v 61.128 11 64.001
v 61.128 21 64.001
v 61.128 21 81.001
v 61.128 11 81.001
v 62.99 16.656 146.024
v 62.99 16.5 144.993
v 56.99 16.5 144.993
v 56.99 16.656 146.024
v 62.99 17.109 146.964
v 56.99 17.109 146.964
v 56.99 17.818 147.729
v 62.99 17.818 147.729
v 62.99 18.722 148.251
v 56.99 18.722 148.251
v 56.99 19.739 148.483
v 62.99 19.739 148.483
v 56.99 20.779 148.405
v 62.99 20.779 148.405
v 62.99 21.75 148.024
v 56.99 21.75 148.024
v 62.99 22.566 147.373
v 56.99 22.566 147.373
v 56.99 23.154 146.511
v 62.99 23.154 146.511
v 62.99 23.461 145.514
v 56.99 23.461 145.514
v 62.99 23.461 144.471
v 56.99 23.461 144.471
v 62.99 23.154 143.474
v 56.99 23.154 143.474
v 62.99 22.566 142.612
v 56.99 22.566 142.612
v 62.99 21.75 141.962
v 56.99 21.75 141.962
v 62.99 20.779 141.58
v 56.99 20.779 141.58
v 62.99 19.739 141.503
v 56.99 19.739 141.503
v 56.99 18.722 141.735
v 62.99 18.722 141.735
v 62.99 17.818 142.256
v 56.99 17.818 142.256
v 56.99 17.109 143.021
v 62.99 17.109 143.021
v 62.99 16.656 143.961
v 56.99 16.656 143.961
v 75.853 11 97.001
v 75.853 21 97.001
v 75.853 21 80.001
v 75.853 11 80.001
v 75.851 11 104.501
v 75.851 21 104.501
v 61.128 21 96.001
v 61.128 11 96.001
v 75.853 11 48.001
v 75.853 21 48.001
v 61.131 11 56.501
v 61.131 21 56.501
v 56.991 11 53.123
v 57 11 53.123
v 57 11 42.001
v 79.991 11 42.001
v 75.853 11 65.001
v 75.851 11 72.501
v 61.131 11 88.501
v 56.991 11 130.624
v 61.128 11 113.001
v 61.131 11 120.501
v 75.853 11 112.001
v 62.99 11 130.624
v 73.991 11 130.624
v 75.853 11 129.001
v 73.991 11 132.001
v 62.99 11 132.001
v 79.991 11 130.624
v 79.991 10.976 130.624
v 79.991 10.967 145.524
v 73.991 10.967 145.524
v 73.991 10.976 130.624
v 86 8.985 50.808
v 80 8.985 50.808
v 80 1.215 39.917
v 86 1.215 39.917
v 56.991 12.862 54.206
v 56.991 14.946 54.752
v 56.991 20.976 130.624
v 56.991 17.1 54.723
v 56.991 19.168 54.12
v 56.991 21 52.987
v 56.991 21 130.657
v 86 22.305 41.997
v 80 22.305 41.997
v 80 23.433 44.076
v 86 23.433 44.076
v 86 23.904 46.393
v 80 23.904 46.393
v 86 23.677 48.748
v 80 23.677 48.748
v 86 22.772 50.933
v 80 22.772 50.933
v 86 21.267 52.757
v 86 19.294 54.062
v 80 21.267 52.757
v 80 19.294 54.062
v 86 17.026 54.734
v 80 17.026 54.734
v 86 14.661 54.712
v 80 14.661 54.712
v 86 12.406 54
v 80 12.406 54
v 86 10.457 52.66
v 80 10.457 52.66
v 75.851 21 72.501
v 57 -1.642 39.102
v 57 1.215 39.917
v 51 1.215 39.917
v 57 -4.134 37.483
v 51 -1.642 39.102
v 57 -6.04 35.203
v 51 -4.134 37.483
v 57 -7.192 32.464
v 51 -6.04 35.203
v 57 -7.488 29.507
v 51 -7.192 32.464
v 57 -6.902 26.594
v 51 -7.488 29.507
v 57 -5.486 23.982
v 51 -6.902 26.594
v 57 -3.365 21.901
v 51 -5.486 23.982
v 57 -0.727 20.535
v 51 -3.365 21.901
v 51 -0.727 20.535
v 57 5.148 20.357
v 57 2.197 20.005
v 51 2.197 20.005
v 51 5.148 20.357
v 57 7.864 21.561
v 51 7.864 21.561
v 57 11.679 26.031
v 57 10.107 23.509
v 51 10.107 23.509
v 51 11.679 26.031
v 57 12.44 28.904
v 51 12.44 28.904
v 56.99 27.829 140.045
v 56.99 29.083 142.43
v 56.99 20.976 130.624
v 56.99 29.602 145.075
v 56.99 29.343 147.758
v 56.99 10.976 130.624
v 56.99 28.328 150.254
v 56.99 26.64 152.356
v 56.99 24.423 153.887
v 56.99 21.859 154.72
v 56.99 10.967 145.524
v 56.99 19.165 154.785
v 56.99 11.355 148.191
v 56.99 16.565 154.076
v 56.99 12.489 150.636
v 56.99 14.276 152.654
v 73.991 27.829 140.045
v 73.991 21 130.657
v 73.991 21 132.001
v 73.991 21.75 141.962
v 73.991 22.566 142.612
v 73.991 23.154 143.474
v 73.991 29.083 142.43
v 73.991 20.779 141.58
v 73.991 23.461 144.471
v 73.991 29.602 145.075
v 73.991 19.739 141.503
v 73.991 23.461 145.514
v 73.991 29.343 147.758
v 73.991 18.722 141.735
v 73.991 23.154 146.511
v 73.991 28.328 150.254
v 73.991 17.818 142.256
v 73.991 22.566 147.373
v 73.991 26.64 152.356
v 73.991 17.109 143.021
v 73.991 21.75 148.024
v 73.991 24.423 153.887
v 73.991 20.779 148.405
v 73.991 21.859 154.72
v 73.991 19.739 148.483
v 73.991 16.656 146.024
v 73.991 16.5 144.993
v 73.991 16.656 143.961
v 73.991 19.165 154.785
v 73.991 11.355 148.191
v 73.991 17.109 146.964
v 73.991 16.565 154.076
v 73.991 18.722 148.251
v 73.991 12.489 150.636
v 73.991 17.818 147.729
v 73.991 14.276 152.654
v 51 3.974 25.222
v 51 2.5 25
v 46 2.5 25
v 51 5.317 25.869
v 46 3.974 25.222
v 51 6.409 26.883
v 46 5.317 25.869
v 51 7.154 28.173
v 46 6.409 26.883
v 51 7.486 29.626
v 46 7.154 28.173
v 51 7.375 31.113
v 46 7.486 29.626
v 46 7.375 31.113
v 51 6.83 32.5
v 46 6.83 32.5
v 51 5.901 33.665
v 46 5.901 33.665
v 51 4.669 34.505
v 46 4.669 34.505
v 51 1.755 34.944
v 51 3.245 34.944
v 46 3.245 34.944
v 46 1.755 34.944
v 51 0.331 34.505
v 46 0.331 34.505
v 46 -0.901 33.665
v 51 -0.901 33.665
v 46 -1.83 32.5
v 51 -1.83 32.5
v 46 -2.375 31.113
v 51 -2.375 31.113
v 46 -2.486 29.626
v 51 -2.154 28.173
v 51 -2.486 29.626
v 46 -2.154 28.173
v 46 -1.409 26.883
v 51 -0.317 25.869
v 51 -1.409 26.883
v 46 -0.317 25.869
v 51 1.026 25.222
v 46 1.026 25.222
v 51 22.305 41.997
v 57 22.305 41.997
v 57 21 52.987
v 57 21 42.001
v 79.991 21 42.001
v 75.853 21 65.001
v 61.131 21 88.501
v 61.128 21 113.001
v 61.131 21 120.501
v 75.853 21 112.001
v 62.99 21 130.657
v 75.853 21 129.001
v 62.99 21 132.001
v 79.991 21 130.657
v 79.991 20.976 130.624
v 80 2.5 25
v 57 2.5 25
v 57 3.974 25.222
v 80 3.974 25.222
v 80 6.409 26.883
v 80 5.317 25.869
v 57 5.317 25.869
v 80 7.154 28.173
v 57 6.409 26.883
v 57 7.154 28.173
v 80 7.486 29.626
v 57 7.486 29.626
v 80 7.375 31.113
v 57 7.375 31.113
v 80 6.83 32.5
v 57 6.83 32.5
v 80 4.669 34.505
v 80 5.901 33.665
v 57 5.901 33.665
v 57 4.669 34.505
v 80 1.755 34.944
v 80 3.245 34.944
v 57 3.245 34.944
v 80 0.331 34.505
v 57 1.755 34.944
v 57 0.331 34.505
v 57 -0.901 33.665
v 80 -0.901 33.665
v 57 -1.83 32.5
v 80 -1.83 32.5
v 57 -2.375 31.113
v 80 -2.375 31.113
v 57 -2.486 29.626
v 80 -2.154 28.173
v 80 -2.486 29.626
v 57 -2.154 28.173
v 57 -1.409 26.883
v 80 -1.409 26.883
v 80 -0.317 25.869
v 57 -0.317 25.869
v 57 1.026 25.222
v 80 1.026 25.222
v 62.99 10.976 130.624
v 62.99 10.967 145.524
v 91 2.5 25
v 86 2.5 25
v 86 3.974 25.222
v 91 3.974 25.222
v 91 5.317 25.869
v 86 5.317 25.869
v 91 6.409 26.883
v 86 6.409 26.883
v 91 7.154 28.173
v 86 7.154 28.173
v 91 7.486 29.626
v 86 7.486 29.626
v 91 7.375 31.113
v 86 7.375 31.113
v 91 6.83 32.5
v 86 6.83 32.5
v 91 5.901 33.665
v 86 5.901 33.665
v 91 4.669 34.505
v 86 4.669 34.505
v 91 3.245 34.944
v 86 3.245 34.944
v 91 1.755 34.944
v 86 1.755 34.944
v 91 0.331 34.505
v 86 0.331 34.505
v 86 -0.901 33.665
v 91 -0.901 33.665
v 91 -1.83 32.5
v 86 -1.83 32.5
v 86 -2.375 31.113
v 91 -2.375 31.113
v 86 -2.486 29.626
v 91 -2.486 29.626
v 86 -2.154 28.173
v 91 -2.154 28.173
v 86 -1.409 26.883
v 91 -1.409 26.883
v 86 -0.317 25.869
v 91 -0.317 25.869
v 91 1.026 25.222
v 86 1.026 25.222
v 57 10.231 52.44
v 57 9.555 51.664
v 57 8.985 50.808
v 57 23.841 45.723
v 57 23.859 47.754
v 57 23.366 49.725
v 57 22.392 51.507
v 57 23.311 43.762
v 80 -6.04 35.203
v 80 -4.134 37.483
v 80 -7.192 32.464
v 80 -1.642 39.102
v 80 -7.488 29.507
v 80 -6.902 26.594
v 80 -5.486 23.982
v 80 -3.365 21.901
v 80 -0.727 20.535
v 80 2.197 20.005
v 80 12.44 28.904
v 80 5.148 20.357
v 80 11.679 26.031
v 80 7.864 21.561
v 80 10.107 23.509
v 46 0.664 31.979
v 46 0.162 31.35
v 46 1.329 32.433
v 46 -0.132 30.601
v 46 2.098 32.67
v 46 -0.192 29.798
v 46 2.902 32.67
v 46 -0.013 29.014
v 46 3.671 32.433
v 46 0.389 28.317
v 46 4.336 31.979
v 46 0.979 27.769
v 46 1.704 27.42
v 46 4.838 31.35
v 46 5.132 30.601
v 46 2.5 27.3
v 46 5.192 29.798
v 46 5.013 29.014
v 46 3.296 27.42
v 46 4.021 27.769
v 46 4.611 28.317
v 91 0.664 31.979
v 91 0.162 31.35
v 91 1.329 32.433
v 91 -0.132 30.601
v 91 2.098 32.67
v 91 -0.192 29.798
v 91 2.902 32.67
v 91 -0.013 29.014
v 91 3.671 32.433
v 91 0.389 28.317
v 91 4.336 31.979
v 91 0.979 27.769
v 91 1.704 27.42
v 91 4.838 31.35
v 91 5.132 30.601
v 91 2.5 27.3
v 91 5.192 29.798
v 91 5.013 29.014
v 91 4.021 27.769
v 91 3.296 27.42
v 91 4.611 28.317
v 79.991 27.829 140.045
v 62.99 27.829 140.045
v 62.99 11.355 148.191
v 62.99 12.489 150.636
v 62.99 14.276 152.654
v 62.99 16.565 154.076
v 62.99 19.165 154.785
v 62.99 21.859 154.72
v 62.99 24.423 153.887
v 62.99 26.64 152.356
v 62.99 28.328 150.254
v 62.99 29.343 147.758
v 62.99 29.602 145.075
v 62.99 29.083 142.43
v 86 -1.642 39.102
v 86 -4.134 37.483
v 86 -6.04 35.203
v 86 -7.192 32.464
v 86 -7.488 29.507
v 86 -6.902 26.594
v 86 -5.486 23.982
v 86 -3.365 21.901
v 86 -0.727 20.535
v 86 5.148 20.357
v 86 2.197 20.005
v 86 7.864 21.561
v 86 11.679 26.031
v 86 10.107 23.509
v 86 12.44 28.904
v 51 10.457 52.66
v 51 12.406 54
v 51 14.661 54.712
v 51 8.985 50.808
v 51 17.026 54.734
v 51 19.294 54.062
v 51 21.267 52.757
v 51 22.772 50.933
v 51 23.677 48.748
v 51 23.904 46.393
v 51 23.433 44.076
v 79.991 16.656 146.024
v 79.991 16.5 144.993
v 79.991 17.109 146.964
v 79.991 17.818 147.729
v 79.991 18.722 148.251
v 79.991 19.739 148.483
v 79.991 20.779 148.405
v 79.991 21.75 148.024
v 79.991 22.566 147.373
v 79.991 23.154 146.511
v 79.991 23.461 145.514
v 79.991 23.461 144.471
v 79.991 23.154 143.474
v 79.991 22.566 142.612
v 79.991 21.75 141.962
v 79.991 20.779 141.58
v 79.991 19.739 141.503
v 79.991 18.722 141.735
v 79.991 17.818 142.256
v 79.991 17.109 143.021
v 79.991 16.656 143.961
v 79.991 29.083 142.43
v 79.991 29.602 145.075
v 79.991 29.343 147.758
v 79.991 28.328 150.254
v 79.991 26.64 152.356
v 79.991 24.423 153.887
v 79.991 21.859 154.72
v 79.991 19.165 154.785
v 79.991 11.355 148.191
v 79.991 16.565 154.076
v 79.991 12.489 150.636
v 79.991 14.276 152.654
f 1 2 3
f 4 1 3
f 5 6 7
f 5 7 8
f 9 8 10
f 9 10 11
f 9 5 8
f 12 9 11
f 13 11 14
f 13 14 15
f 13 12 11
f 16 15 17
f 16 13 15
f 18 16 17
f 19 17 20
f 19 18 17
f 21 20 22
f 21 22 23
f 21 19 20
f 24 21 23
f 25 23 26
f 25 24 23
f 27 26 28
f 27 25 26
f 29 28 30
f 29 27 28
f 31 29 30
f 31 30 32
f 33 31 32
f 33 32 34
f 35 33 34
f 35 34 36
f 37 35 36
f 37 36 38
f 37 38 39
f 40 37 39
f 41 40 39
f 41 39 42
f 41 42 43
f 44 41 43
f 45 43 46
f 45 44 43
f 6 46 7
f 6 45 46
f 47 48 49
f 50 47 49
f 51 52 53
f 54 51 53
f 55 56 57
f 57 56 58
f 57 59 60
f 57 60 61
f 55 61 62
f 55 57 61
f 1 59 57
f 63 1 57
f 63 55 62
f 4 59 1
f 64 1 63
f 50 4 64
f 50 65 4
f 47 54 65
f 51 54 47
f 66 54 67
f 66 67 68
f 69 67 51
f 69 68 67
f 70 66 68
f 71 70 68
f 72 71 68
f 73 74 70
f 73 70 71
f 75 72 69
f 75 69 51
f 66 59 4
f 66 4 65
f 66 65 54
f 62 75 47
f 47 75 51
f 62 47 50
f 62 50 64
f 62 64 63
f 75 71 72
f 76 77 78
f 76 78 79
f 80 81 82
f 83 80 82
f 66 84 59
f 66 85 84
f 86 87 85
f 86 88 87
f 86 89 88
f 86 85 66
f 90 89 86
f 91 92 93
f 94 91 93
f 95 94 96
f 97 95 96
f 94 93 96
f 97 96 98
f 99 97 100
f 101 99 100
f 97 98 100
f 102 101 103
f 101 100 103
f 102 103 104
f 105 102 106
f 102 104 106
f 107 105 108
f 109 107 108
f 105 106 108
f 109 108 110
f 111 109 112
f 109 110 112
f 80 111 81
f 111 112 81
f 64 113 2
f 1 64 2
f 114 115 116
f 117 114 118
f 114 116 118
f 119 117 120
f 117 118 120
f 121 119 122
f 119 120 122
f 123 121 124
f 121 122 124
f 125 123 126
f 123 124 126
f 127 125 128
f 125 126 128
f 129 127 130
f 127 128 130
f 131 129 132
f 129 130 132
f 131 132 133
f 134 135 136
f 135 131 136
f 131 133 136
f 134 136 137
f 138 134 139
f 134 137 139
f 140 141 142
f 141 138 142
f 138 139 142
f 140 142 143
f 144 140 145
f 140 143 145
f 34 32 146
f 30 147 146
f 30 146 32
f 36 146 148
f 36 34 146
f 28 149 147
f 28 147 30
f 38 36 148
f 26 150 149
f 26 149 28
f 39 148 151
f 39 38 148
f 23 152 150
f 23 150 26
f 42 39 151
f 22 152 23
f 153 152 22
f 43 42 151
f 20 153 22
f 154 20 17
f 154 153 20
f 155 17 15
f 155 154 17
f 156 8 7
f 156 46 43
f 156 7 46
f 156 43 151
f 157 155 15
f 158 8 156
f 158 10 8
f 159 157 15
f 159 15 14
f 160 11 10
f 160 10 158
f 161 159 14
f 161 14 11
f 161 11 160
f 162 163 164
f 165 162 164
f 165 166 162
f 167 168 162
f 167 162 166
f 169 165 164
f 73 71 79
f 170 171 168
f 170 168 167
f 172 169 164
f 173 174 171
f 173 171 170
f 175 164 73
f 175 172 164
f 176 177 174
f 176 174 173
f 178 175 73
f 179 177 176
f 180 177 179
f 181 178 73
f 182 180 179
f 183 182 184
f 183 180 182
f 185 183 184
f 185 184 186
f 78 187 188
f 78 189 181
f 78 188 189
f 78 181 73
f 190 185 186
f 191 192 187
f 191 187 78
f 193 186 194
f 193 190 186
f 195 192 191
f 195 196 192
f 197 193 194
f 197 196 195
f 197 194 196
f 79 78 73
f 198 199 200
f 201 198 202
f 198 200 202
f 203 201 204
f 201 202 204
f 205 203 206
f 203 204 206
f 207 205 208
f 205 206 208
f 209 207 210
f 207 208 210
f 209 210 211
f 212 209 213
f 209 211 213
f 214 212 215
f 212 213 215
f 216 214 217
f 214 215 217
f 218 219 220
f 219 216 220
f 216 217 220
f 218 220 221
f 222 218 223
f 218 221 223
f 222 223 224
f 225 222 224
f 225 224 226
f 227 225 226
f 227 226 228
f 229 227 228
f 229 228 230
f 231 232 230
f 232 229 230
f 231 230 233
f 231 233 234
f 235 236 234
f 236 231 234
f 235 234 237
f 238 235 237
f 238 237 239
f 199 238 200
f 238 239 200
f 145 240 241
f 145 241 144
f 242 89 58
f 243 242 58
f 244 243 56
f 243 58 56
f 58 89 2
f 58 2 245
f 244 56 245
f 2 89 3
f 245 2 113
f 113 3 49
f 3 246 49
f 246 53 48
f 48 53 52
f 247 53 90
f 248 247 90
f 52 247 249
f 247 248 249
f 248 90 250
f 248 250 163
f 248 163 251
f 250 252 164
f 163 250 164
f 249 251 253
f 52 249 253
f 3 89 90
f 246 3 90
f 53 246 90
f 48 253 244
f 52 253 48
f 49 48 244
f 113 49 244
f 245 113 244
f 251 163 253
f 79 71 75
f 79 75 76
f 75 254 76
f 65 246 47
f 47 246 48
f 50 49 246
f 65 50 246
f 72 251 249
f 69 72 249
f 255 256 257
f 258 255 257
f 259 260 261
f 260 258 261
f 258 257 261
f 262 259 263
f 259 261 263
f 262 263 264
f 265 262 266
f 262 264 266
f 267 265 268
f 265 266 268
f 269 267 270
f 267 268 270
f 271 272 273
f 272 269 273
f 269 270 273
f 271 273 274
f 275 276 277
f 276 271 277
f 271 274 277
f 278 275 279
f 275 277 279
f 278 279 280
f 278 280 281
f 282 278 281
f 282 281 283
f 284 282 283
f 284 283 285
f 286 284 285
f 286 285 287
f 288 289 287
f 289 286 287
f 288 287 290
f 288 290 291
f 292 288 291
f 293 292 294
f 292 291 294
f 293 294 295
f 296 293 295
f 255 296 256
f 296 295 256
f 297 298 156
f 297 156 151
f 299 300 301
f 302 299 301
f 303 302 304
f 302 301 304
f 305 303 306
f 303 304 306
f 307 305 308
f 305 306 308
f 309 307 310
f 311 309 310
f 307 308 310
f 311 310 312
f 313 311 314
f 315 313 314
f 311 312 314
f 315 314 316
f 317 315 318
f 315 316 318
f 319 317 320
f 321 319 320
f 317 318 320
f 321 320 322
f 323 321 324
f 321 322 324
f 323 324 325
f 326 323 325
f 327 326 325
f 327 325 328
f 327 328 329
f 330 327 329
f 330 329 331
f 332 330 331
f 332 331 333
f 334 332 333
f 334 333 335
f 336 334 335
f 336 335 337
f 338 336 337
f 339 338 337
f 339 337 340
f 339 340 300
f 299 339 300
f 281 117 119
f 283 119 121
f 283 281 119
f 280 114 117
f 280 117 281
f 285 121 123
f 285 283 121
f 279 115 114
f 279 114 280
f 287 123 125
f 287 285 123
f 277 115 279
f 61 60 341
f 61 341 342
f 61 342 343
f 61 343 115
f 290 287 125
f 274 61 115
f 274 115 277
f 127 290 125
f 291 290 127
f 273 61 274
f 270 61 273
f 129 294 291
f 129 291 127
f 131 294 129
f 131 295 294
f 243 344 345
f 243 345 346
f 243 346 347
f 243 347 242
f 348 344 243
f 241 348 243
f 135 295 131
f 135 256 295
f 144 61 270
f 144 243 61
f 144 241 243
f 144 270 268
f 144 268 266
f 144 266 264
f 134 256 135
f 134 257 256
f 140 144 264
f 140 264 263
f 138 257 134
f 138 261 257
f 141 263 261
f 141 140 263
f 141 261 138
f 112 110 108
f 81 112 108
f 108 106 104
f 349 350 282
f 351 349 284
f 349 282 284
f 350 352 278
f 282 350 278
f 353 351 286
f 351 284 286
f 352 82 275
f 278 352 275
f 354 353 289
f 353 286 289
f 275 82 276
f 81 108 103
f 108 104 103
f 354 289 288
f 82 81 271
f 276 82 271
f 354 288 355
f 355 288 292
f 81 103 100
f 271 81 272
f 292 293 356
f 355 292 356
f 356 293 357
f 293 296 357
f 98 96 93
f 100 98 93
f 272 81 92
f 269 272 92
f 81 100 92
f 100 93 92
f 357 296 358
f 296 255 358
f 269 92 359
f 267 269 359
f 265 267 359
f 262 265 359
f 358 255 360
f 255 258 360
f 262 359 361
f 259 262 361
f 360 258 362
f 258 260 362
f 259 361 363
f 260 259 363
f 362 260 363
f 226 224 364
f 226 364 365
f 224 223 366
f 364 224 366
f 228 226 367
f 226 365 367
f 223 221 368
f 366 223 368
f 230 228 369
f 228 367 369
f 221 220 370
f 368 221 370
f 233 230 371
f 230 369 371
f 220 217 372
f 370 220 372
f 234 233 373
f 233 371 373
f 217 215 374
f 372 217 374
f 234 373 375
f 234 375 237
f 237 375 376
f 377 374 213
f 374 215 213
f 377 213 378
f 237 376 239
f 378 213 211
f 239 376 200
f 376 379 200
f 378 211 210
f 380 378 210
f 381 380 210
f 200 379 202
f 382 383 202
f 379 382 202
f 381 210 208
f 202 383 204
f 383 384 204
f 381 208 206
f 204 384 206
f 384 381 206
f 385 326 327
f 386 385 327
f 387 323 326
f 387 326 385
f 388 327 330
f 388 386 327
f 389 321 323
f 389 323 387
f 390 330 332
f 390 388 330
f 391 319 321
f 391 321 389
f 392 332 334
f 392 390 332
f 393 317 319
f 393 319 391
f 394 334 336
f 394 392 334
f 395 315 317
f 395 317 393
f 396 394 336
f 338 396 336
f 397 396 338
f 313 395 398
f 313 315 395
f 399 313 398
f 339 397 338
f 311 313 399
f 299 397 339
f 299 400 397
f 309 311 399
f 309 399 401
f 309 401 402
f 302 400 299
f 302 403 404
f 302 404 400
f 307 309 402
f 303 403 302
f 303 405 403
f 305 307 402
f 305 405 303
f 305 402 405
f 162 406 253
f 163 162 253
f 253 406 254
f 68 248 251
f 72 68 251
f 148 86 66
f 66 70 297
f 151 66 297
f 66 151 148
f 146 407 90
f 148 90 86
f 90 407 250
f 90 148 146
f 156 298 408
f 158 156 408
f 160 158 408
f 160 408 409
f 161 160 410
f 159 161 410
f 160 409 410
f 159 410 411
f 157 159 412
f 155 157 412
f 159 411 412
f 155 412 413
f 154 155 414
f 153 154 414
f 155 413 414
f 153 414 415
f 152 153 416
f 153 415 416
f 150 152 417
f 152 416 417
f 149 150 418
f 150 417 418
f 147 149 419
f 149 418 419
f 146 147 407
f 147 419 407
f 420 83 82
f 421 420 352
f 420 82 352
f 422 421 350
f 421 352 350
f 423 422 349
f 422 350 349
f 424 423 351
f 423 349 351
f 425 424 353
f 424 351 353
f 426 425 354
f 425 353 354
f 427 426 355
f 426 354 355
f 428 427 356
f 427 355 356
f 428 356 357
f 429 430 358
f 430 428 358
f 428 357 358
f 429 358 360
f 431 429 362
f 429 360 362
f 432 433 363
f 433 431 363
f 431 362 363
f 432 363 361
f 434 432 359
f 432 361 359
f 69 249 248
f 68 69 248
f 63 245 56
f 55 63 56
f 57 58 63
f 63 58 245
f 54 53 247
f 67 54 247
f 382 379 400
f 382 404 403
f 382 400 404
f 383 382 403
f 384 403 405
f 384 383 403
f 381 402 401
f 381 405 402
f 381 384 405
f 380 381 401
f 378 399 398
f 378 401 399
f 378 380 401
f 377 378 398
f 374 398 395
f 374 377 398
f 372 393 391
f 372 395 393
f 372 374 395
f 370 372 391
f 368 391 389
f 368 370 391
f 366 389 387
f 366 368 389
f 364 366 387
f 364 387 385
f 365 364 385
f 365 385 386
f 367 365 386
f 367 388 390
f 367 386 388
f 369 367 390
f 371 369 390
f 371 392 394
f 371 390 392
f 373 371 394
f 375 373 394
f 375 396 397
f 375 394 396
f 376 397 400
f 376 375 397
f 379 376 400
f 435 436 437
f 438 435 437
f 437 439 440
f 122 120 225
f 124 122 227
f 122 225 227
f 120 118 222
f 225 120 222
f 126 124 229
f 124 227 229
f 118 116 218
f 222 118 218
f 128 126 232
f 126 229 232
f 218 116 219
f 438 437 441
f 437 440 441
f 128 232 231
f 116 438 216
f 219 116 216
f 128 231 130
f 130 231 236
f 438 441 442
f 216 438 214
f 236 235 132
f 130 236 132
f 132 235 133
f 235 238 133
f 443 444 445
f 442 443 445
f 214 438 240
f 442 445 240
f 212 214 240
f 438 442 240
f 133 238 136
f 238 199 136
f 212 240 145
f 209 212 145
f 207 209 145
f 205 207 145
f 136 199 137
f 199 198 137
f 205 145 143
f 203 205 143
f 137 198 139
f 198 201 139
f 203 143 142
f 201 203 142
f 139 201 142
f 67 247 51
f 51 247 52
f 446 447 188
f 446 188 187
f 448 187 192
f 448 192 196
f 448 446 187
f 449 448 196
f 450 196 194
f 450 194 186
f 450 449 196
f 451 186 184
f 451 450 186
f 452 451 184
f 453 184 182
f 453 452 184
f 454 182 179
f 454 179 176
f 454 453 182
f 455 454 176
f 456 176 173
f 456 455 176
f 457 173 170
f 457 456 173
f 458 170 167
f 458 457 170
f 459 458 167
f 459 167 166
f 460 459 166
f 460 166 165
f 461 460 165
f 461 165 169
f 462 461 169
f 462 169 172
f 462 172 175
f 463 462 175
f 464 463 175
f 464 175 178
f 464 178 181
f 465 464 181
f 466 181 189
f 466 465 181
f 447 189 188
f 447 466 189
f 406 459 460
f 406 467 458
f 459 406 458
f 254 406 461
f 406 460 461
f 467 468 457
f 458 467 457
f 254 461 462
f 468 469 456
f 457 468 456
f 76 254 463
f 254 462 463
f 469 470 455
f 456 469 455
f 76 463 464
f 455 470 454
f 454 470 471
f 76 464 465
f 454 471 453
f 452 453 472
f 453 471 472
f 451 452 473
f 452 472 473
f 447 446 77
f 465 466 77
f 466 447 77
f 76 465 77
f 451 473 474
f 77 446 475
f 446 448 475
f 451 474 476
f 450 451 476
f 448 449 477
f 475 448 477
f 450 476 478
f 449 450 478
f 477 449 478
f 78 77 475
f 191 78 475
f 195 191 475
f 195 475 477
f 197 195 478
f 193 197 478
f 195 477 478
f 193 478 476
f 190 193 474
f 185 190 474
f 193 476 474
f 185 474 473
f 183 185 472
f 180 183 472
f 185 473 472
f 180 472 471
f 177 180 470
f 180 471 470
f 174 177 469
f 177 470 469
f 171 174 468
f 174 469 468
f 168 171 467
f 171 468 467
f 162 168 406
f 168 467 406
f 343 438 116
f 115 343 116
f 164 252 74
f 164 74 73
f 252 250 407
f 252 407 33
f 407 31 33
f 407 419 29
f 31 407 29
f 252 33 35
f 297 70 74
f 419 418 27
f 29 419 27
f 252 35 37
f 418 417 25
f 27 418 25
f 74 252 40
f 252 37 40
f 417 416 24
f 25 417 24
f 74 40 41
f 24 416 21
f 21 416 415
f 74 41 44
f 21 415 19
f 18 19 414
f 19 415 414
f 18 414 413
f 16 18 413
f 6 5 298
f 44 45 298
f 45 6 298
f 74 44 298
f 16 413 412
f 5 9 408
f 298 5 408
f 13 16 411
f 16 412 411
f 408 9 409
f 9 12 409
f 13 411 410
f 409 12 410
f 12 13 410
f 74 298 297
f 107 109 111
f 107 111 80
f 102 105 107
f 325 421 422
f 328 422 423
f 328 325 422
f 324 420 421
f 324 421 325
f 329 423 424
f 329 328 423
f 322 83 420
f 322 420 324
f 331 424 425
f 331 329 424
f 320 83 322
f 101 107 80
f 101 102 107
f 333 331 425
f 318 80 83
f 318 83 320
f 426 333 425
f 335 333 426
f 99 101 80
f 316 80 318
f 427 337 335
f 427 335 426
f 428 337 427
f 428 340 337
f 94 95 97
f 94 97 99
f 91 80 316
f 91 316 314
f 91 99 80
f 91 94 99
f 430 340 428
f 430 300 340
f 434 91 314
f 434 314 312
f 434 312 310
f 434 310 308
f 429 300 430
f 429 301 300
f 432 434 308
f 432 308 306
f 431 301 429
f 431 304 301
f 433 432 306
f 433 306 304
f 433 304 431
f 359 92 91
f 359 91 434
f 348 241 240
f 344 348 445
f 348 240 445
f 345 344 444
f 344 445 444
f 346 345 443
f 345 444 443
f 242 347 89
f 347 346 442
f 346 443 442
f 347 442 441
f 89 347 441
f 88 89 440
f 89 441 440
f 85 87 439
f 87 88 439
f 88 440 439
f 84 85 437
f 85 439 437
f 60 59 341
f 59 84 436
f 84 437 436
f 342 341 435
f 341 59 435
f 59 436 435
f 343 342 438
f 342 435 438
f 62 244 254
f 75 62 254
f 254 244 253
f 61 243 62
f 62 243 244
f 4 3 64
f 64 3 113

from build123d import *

# Parameters (mm, degrees)
SKETCH023_R       = 3.5
EXTRUDE022_DEPTH  = 6
SKETCH021_W       = 23
SKETCH021_H       = 90
EXTRUDE020_DEPTH  = 10
CYLINDER028_R     = 3
CYLINDER028_DEPTH = 25
CYLINDER027_R     = 7
CYLINDER027_DEPTH = 30
CYLINDER026_R     = 10
CYLINDER026_DEPTH = 6
EXTRUDE021_DEPTH  = 6
CYLINDER030_R     = 2.7
CYLINDER030_DEPTH = 50
CYLINDER029_R     = 5
CYLINDER029_DEPTH = 45


with BuildPart() as union_brazo_central004:
    # Sketch023 → Extrude022 (new body)
    with BuildSketch(Plane(origin=(0, 0, 0), x_dir=(0, -1, 0), z_dir=(-1, 0, 0))):
        with BuildLine():
            ThreePointArc((-10.966848, 145.524062), (-23.171274, 154.396494), (-27.829317, 140.044816))
            Line((-27.829317, 140.044816), (-20.975712, 130.624062))
            Line((-20.975712, 130.624062), (-10.975712, 130.624062))
            Line((-10.966848, 145.524062), (-10.975712, 130.624062))
        make_face()
        with Locations((-20.000471, 144.992747)):
            Circle(SKETCH023_R, mode=Mode.SUBTRACT)
    extrude(amount=EXTRUDE022_DEPTH)


with BuildPart() as union_brazo_central004_1:
    # Extrude022 placement: moved
    add(union_brazo_central004.part.moved(Location((62.99, 0, 0))))


with BuildPart() as union_brazo_central005:
    # Link021 base: copy of Union brazo central004
    add(union_brazo_central004_1.part)


with BuildPart() as union_brazo_central005_1:
    # Link021 placement: moved
    add(union_brazo_central005.part.moved(Location((17.001, 0, 0))))


with BuildPart() as brazo_central_triangulos:
    # Sketch021 → Extrude020 (new body)
    with BuildSketch(Plane.XZ):
        with Locations((68.040845, 88.110787)):
            Rectangle(SKETCH021_W, SKETCH021_H)
        Polygon((60.680845, 57.610787), (75.403277, 66.110787), (75.403277, 49.110787), align=None, mode=Mode.SUBTRACT)
        Polygon((60.678413, 65.110787), (60.678413, 82.110787), (75.400845, 73.610787), align=None, mode=Mode.SUBTRACT)
        Polygon((60.680845, 89.610787), (75.403277, 98.110787), (75.403277, 81.110787), align=None, mode=Mode.SUBTRACT)
        Polygon((60.678413, 97.110787), (60.678413, 114.110787), (75.400845, 105.610787), align=None, mode=Mode.SUBTRACT)
        Polygon((60.680845, 121.610787), (75.403277, 130.110787), (75.403277, 113.110787), align=None, mode=Mode.SUBTRACT)
    extrude(amount=EXTRUDE020_DEPTH)


with BuildPart() as brazo_central_triangulos_1:
    # Extrude020 placement: moved
    add(brazo_central_triangulos.part.moved(Location((0.45, 21, -1.11))))


with BuildPart() as rotor011:
    # Cylinder028 → Cylinder028 (new body)
    with BuildSketch(Plane(origin=(40, 2.5, 30), x_dir=(0, 0, -1), z_dir=(1, 0, 0))):
        Circle(CYLINDER028_R)
    extrude(amount=CYLINDER028_DEPTH)


with BuildPart() as rotor010:
    # Cylinder027 → Cylinder027 (new body)
    with BuildSketch(Plane(origin=(63, 2.5, 30), x_dir=(0, 0, -1), z_dir=(1, 0, 0))):
        Circle(CYLINDER027_R)
    extrude(amount=CYLINDER027_DEPTH)


with BuildPart() as union_motor_izq001:
    # Cylinder026 → Cylinder026 (new body)
    with BuildSketch(Plane(origin=(54, 2.5, 30), x_dir=(0, 0, -1), z_dir=(1, 0, 0))):
        Circle(CYLINDER026_R)
    extrude(amount=CYLINDER026_DEPTH)

    # Cut013: cut Rotor010
    add(rotor010.part, mode=Mode.SUBTRACT)

    # Cut014: cut Rotor011
    add(rotor011.part, mode=Mode.SUBTRACT)


with BuildPart() as union_motor_centro002:
    # Sketch022 → Extrude021 (new body)
    with BuildSketch(Plane.YZ):
        with BuildLine():
            ThreePointArc((22.654639, 41.99706), (20.679007, 53.483206), (9.335322, 50.808228))
            Line((9.335322, 50.808228), (1.552816, 39.899855))
            ThreePointArc((12.665635, 28.738862), (9.310536, 36.511168), (1.552816, 39.899855))
            Line((22.654639, 41.99706), (12.665635, 28.738862))
        make_face()
    extrude(amount=EXTRUDE021_DEPTH)


with BuildPart() as union_motor_centro002_1:
    # Extrude021 placement: moved
    add(union_motor_centro002.part.moved(Location((54, -0.35, 0))))

    # Fusion024: union Union motor izq001
    add(union_motor_izq001.part)


with BuildPart() as union_motor_centro003:
    # Link020 base: copy of Union motor centro002
    add(union_motor_centro002_1.part)


with BuildPart() as union_motor_centro003_1:
    # Link020 placement: moved
    add(union_motor_centro003.part.moved(Location((28.999998, -3e-06, 0))))


with BuildPart() as hueco_rotor001:
    # Cylinder030 → Cylinder030 (new body)
    with BuildSketch(Plane(origin=(37, 2.5, 30), x_dir=(0, 0, -1), z_dir=(1, 0, 0))):
        Circle(CYLINDER030_R)
    extrude(amount=CYLINDER030_DEPTH)


with BuildPart() as brazo_central_v3:
    # Cylinder029 → Cylinder029 (new body)
    with BuildSketch(Plane(origin=(40, 2.5, 30), x_dir=(0, 0, -1), z_dir=(1, 0, 0))):
        Circle(CYLINDER029_R)
    extrude(amount=CYLINDER029_DEPTH)

    # Cut015: cut hueco rotor001
    add(hueco_rotor001.part, mode=Mode.SUBTRACT)


with BuildPart() as brazo_central_v3_1:
    # Cut015 placement: moved
    add(brazo_central_v3.part.moved(Location((9, 0, 0))))

    # Fusion025: union Union motor centro003, Union motor centro002
    add(union_motor_centro003_1.part)
    add(union_motor_centro002_1.part)


with BuildPart() as brazo_central_v3_2:
    # Fusion025 placement: moved
    add(brazo_central_v3_1.part.moved(Location((-3, 0, 0))))

    # Fusion026: union Union brazo central004, Union brazo central005, brazo central triangulos
    add(union_brazo_central004_1.part)
    add(union_brazo_central005_1.part)
    add(brazo_central_triangulos_1.part)


solid = brazo_central_v3_2.part
